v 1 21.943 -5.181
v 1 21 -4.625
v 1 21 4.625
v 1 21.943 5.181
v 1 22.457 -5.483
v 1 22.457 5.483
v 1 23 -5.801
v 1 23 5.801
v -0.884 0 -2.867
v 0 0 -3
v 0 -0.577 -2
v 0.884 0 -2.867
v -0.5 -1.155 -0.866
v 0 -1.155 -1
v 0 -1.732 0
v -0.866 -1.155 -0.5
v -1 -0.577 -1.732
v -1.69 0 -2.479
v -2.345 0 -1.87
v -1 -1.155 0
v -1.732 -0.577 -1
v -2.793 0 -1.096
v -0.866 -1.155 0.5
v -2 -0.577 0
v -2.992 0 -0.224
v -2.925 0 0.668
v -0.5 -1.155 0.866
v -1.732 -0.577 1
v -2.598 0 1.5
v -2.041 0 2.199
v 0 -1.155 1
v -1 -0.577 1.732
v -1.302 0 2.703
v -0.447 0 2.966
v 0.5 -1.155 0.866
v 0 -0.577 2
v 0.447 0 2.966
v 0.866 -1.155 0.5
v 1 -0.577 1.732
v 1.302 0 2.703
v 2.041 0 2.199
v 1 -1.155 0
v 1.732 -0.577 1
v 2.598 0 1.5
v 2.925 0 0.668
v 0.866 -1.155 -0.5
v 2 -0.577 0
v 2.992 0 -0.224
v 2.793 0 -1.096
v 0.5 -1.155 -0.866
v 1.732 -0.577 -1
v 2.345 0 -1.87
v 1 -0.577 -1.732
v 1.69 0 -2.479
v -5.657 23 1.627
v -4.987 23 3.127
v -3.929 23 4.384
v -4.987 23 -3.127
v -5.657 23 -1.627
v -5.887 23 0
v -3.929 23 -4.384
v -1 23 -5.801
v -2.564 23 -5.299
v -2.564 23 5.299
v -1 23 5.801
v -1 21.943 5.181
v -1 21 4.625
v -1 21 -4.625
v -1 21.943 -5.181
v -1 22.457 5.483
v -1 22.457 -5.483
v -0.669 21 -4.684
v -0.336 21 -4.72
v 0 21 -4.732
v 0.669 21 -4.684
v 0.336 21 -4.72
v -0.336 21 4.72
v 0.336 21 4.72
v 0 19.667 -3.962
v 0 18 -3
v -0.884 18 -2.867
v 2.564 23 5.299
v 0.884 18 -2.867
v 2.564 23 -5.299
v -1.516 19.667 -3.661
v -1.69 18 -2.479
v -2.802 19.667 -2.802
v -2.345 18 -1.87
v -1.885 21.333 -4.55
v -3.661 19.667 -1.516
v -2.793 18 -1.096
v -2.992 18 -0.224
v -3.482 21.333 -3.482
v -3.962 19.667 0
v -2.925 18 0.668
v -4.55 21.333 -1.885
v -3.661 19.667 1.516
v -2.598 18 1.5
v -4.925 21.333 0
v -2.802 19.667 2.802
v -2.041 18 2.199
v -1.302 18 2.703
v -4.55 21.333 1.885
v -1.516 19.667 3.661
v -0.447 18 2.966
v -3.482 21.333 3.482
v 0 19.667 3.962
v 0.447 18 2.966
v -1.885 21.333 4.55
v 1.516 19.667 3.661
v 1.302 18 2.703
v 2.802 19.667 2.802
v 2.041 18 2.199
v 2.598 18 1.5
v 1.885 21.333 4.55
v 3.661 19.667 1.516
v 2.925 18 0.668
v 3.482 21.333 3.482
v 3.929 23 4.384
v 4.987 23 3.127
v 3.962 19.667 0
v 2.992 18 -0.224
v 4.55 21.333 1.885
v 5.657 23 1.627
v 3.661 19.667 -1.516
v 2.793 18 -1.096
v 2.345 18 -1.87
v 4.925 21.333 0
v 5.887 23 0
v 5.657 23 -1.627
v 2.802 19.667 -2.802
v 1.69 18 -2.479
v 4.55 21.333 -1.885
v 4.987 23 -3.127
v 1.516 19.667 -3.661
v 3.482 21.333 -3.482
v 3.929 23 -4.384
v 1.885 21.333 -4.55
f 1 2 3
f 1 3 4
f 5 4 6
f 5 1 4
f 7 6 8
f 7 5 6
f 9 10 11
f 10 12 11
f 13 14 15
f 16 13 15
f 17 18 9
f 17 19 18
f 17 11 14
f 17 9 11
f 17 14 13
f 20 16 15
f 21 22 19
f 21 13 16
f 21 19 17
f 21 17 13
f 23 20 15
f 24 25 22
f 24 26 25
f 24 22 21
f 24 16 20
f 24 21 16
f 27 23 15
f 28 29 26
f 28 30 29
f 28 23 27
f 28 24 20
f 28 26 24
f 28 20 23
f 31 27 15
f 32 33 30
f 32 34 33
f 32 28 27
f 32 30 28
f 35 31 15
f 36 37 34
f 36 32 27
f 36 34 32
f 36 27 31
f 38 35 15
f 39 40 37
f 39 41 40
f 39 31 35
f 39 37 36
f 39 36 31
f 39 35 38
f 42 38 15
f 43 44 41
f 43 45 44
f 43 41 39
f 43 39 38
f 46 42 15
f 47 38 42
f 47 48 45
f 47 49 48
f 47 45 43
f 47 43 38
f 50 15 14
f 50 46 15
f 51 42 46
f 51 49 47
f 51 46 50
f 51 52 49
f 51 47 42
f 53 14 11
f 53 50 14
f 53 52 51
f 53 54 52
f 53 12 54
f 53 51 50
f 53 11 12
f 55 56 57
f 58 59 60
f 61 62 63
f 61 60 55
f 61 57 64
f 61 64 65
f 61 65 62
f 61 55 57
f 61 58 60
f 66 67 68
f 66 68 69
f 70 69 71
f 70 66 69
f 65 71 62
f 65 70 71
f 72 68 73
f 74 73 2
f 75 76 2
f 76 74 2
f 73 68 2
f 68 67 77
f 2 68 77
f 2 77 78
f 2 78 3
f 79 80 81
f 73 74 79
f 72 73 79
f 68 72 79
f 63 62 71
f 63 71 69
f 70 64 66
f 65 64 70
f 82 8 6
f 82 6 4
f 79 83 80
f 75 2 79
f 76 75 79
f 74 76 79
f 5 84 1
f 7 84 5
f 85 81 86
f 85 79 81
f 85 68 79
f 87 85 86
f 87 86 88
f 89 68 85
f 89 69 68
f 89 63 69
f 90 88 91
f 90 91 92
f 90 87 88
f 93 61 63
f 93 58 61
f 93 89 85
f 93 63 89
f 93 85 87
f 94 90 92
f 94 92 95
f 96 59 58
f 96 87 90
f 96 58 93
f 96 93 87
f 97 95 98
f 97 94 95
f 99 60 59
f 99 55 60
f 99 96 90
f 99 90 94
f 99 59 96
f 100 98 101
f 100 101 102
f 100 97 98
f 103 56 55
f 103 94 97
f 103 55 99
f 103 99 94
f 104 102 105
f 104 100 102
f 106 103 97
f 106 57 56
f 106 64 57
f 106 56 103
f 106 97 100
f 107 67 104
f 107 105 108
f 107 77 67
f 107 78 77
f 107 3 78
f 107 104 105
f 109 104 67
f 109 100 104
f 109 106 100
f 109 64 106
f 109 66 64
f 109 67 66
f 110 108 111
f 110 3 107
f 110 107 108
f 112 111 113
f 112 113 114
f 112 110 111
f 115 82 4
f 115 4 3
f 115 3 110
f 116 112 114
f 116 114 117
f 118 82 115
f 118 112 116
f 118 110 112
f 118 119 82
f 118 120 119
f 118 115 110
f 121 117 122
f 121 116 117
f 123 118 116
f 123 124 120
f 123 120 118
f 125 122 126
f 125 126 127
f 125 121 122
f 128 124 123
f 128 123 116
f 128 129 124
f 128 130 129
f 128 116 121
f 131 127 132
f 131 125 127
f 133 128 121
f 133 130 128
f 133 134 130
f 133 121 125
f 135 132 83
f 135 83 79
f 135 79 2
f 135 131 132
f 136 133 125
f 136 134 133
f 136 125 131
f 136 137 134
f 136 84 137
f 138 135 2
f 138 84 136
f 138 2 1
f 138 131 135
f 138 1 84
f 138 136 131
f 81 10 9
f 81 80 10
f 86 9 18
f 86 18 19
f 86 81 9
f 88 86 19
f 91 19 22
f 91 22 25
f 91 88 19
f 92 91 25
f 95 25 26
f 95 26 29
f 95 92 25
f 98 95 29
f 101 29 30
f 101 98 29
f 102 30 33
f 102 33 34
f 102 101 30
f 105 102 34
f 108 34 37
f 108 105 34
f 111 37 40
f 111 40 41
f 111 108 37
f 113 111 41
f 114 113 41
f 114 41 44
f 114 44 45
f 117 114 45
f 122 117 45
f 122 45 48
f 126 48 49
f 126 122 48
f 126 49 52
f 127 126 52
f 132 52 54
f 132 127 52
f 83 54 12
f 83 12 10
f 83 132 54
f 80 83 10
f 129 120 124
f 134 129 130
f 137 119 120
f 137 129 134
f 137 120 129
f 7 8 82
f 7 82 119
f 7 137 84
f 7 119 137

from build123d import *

# Parameters (mm, degrees)
EXTRUDE1_REACH             = 26.46
SKETCH2_W                  = 2
SKETCH2_H                  = 2
EXTRUDE1_DIRECTION_2_REACH = 26.46


with BuildPart() as part:
    # Sketch1 → Revolve1 (revolve)
    with BuildSketch(Plane.XY, mode=Mode.PRIVATE) as revolve1_sk:
        Polygon((-3, 0), (-3, 18), (-5.886751346, 23), (0, 23), (0, 0), (0, -1.732050808), align=None)
    revolve(revolve1_sk.sketch.rotate(Axis((0, 0, 0), (0, 1, 0)), 270), axis=Axis((0, 0, 0), (0, 1, 0)))

    # Extrude1: up to this cone (the profile starts inside it)
    extrude1_end = Plane(origin=(0, 22, 0), z_dir=(0, 1, 0)).offset(-9.196151423) * Cone(1e-06, 23.940148475, 41.465552499, align=(Align.CENTER, Align.CENTER, Align.MIN), mode=Mode.PRIVATE)
    # Sketch2 → Extrude1 (cut, up to the surface)
    with BuildSketch(Plane.XY, mode=Mode.PRIVATE) as extrude1_sk1:
        with Locations((0, 22)):
            Rectangle(SKETCH2_W, SKETCH2_H)
    extrude1_tool1 = extrude(extrude1_sk1.sketch, amount=-EXTRUDE1_REACH, mode=Mode.PRIVATE) & extrude1_end
    add(extrude1_tool1.solids().sort_by_distance((0, 22, 0))[0], mode=Mode.SUBTRACT)

    # Extrude1 direction 2: up to this cone (the profile starts inside it)
    extrude1_direction_2_end = Plane(origin=(0, 22, 0), z_dir=(0, 1, 0)).offset(-9.196151423) * Cone(1e-06, 23.940148475, 41.465552499, align=(Align.CENTER, Align.CENTER, Align.MIN), mode=Mode.PRIVATE)
    # Sketch2 → Extrude1 direction 2 (cut, up to the surface)
    with BuildSketch(Plane.XY, mode=Mode.PRIVATE) as extrude1_direction_2_sk1:
        with Locations((0, 22)):
            Rectangle(SKETCH2_W, SKETCH2_H)
    extrude1_direction_2_tool1 = extrude(extrude1_direction_2_sk1.sketch, amount=EXTRUDE1_DIRECTION_2_REACH, mode=Mode.PRIVATE) & extrude1_direction_2_end
    add(extrude1_direction_2_tool1.solids().sort_by_distance((0, 22, 0))[0], mode=Mode.SUBTRACT)


solid = part.part
